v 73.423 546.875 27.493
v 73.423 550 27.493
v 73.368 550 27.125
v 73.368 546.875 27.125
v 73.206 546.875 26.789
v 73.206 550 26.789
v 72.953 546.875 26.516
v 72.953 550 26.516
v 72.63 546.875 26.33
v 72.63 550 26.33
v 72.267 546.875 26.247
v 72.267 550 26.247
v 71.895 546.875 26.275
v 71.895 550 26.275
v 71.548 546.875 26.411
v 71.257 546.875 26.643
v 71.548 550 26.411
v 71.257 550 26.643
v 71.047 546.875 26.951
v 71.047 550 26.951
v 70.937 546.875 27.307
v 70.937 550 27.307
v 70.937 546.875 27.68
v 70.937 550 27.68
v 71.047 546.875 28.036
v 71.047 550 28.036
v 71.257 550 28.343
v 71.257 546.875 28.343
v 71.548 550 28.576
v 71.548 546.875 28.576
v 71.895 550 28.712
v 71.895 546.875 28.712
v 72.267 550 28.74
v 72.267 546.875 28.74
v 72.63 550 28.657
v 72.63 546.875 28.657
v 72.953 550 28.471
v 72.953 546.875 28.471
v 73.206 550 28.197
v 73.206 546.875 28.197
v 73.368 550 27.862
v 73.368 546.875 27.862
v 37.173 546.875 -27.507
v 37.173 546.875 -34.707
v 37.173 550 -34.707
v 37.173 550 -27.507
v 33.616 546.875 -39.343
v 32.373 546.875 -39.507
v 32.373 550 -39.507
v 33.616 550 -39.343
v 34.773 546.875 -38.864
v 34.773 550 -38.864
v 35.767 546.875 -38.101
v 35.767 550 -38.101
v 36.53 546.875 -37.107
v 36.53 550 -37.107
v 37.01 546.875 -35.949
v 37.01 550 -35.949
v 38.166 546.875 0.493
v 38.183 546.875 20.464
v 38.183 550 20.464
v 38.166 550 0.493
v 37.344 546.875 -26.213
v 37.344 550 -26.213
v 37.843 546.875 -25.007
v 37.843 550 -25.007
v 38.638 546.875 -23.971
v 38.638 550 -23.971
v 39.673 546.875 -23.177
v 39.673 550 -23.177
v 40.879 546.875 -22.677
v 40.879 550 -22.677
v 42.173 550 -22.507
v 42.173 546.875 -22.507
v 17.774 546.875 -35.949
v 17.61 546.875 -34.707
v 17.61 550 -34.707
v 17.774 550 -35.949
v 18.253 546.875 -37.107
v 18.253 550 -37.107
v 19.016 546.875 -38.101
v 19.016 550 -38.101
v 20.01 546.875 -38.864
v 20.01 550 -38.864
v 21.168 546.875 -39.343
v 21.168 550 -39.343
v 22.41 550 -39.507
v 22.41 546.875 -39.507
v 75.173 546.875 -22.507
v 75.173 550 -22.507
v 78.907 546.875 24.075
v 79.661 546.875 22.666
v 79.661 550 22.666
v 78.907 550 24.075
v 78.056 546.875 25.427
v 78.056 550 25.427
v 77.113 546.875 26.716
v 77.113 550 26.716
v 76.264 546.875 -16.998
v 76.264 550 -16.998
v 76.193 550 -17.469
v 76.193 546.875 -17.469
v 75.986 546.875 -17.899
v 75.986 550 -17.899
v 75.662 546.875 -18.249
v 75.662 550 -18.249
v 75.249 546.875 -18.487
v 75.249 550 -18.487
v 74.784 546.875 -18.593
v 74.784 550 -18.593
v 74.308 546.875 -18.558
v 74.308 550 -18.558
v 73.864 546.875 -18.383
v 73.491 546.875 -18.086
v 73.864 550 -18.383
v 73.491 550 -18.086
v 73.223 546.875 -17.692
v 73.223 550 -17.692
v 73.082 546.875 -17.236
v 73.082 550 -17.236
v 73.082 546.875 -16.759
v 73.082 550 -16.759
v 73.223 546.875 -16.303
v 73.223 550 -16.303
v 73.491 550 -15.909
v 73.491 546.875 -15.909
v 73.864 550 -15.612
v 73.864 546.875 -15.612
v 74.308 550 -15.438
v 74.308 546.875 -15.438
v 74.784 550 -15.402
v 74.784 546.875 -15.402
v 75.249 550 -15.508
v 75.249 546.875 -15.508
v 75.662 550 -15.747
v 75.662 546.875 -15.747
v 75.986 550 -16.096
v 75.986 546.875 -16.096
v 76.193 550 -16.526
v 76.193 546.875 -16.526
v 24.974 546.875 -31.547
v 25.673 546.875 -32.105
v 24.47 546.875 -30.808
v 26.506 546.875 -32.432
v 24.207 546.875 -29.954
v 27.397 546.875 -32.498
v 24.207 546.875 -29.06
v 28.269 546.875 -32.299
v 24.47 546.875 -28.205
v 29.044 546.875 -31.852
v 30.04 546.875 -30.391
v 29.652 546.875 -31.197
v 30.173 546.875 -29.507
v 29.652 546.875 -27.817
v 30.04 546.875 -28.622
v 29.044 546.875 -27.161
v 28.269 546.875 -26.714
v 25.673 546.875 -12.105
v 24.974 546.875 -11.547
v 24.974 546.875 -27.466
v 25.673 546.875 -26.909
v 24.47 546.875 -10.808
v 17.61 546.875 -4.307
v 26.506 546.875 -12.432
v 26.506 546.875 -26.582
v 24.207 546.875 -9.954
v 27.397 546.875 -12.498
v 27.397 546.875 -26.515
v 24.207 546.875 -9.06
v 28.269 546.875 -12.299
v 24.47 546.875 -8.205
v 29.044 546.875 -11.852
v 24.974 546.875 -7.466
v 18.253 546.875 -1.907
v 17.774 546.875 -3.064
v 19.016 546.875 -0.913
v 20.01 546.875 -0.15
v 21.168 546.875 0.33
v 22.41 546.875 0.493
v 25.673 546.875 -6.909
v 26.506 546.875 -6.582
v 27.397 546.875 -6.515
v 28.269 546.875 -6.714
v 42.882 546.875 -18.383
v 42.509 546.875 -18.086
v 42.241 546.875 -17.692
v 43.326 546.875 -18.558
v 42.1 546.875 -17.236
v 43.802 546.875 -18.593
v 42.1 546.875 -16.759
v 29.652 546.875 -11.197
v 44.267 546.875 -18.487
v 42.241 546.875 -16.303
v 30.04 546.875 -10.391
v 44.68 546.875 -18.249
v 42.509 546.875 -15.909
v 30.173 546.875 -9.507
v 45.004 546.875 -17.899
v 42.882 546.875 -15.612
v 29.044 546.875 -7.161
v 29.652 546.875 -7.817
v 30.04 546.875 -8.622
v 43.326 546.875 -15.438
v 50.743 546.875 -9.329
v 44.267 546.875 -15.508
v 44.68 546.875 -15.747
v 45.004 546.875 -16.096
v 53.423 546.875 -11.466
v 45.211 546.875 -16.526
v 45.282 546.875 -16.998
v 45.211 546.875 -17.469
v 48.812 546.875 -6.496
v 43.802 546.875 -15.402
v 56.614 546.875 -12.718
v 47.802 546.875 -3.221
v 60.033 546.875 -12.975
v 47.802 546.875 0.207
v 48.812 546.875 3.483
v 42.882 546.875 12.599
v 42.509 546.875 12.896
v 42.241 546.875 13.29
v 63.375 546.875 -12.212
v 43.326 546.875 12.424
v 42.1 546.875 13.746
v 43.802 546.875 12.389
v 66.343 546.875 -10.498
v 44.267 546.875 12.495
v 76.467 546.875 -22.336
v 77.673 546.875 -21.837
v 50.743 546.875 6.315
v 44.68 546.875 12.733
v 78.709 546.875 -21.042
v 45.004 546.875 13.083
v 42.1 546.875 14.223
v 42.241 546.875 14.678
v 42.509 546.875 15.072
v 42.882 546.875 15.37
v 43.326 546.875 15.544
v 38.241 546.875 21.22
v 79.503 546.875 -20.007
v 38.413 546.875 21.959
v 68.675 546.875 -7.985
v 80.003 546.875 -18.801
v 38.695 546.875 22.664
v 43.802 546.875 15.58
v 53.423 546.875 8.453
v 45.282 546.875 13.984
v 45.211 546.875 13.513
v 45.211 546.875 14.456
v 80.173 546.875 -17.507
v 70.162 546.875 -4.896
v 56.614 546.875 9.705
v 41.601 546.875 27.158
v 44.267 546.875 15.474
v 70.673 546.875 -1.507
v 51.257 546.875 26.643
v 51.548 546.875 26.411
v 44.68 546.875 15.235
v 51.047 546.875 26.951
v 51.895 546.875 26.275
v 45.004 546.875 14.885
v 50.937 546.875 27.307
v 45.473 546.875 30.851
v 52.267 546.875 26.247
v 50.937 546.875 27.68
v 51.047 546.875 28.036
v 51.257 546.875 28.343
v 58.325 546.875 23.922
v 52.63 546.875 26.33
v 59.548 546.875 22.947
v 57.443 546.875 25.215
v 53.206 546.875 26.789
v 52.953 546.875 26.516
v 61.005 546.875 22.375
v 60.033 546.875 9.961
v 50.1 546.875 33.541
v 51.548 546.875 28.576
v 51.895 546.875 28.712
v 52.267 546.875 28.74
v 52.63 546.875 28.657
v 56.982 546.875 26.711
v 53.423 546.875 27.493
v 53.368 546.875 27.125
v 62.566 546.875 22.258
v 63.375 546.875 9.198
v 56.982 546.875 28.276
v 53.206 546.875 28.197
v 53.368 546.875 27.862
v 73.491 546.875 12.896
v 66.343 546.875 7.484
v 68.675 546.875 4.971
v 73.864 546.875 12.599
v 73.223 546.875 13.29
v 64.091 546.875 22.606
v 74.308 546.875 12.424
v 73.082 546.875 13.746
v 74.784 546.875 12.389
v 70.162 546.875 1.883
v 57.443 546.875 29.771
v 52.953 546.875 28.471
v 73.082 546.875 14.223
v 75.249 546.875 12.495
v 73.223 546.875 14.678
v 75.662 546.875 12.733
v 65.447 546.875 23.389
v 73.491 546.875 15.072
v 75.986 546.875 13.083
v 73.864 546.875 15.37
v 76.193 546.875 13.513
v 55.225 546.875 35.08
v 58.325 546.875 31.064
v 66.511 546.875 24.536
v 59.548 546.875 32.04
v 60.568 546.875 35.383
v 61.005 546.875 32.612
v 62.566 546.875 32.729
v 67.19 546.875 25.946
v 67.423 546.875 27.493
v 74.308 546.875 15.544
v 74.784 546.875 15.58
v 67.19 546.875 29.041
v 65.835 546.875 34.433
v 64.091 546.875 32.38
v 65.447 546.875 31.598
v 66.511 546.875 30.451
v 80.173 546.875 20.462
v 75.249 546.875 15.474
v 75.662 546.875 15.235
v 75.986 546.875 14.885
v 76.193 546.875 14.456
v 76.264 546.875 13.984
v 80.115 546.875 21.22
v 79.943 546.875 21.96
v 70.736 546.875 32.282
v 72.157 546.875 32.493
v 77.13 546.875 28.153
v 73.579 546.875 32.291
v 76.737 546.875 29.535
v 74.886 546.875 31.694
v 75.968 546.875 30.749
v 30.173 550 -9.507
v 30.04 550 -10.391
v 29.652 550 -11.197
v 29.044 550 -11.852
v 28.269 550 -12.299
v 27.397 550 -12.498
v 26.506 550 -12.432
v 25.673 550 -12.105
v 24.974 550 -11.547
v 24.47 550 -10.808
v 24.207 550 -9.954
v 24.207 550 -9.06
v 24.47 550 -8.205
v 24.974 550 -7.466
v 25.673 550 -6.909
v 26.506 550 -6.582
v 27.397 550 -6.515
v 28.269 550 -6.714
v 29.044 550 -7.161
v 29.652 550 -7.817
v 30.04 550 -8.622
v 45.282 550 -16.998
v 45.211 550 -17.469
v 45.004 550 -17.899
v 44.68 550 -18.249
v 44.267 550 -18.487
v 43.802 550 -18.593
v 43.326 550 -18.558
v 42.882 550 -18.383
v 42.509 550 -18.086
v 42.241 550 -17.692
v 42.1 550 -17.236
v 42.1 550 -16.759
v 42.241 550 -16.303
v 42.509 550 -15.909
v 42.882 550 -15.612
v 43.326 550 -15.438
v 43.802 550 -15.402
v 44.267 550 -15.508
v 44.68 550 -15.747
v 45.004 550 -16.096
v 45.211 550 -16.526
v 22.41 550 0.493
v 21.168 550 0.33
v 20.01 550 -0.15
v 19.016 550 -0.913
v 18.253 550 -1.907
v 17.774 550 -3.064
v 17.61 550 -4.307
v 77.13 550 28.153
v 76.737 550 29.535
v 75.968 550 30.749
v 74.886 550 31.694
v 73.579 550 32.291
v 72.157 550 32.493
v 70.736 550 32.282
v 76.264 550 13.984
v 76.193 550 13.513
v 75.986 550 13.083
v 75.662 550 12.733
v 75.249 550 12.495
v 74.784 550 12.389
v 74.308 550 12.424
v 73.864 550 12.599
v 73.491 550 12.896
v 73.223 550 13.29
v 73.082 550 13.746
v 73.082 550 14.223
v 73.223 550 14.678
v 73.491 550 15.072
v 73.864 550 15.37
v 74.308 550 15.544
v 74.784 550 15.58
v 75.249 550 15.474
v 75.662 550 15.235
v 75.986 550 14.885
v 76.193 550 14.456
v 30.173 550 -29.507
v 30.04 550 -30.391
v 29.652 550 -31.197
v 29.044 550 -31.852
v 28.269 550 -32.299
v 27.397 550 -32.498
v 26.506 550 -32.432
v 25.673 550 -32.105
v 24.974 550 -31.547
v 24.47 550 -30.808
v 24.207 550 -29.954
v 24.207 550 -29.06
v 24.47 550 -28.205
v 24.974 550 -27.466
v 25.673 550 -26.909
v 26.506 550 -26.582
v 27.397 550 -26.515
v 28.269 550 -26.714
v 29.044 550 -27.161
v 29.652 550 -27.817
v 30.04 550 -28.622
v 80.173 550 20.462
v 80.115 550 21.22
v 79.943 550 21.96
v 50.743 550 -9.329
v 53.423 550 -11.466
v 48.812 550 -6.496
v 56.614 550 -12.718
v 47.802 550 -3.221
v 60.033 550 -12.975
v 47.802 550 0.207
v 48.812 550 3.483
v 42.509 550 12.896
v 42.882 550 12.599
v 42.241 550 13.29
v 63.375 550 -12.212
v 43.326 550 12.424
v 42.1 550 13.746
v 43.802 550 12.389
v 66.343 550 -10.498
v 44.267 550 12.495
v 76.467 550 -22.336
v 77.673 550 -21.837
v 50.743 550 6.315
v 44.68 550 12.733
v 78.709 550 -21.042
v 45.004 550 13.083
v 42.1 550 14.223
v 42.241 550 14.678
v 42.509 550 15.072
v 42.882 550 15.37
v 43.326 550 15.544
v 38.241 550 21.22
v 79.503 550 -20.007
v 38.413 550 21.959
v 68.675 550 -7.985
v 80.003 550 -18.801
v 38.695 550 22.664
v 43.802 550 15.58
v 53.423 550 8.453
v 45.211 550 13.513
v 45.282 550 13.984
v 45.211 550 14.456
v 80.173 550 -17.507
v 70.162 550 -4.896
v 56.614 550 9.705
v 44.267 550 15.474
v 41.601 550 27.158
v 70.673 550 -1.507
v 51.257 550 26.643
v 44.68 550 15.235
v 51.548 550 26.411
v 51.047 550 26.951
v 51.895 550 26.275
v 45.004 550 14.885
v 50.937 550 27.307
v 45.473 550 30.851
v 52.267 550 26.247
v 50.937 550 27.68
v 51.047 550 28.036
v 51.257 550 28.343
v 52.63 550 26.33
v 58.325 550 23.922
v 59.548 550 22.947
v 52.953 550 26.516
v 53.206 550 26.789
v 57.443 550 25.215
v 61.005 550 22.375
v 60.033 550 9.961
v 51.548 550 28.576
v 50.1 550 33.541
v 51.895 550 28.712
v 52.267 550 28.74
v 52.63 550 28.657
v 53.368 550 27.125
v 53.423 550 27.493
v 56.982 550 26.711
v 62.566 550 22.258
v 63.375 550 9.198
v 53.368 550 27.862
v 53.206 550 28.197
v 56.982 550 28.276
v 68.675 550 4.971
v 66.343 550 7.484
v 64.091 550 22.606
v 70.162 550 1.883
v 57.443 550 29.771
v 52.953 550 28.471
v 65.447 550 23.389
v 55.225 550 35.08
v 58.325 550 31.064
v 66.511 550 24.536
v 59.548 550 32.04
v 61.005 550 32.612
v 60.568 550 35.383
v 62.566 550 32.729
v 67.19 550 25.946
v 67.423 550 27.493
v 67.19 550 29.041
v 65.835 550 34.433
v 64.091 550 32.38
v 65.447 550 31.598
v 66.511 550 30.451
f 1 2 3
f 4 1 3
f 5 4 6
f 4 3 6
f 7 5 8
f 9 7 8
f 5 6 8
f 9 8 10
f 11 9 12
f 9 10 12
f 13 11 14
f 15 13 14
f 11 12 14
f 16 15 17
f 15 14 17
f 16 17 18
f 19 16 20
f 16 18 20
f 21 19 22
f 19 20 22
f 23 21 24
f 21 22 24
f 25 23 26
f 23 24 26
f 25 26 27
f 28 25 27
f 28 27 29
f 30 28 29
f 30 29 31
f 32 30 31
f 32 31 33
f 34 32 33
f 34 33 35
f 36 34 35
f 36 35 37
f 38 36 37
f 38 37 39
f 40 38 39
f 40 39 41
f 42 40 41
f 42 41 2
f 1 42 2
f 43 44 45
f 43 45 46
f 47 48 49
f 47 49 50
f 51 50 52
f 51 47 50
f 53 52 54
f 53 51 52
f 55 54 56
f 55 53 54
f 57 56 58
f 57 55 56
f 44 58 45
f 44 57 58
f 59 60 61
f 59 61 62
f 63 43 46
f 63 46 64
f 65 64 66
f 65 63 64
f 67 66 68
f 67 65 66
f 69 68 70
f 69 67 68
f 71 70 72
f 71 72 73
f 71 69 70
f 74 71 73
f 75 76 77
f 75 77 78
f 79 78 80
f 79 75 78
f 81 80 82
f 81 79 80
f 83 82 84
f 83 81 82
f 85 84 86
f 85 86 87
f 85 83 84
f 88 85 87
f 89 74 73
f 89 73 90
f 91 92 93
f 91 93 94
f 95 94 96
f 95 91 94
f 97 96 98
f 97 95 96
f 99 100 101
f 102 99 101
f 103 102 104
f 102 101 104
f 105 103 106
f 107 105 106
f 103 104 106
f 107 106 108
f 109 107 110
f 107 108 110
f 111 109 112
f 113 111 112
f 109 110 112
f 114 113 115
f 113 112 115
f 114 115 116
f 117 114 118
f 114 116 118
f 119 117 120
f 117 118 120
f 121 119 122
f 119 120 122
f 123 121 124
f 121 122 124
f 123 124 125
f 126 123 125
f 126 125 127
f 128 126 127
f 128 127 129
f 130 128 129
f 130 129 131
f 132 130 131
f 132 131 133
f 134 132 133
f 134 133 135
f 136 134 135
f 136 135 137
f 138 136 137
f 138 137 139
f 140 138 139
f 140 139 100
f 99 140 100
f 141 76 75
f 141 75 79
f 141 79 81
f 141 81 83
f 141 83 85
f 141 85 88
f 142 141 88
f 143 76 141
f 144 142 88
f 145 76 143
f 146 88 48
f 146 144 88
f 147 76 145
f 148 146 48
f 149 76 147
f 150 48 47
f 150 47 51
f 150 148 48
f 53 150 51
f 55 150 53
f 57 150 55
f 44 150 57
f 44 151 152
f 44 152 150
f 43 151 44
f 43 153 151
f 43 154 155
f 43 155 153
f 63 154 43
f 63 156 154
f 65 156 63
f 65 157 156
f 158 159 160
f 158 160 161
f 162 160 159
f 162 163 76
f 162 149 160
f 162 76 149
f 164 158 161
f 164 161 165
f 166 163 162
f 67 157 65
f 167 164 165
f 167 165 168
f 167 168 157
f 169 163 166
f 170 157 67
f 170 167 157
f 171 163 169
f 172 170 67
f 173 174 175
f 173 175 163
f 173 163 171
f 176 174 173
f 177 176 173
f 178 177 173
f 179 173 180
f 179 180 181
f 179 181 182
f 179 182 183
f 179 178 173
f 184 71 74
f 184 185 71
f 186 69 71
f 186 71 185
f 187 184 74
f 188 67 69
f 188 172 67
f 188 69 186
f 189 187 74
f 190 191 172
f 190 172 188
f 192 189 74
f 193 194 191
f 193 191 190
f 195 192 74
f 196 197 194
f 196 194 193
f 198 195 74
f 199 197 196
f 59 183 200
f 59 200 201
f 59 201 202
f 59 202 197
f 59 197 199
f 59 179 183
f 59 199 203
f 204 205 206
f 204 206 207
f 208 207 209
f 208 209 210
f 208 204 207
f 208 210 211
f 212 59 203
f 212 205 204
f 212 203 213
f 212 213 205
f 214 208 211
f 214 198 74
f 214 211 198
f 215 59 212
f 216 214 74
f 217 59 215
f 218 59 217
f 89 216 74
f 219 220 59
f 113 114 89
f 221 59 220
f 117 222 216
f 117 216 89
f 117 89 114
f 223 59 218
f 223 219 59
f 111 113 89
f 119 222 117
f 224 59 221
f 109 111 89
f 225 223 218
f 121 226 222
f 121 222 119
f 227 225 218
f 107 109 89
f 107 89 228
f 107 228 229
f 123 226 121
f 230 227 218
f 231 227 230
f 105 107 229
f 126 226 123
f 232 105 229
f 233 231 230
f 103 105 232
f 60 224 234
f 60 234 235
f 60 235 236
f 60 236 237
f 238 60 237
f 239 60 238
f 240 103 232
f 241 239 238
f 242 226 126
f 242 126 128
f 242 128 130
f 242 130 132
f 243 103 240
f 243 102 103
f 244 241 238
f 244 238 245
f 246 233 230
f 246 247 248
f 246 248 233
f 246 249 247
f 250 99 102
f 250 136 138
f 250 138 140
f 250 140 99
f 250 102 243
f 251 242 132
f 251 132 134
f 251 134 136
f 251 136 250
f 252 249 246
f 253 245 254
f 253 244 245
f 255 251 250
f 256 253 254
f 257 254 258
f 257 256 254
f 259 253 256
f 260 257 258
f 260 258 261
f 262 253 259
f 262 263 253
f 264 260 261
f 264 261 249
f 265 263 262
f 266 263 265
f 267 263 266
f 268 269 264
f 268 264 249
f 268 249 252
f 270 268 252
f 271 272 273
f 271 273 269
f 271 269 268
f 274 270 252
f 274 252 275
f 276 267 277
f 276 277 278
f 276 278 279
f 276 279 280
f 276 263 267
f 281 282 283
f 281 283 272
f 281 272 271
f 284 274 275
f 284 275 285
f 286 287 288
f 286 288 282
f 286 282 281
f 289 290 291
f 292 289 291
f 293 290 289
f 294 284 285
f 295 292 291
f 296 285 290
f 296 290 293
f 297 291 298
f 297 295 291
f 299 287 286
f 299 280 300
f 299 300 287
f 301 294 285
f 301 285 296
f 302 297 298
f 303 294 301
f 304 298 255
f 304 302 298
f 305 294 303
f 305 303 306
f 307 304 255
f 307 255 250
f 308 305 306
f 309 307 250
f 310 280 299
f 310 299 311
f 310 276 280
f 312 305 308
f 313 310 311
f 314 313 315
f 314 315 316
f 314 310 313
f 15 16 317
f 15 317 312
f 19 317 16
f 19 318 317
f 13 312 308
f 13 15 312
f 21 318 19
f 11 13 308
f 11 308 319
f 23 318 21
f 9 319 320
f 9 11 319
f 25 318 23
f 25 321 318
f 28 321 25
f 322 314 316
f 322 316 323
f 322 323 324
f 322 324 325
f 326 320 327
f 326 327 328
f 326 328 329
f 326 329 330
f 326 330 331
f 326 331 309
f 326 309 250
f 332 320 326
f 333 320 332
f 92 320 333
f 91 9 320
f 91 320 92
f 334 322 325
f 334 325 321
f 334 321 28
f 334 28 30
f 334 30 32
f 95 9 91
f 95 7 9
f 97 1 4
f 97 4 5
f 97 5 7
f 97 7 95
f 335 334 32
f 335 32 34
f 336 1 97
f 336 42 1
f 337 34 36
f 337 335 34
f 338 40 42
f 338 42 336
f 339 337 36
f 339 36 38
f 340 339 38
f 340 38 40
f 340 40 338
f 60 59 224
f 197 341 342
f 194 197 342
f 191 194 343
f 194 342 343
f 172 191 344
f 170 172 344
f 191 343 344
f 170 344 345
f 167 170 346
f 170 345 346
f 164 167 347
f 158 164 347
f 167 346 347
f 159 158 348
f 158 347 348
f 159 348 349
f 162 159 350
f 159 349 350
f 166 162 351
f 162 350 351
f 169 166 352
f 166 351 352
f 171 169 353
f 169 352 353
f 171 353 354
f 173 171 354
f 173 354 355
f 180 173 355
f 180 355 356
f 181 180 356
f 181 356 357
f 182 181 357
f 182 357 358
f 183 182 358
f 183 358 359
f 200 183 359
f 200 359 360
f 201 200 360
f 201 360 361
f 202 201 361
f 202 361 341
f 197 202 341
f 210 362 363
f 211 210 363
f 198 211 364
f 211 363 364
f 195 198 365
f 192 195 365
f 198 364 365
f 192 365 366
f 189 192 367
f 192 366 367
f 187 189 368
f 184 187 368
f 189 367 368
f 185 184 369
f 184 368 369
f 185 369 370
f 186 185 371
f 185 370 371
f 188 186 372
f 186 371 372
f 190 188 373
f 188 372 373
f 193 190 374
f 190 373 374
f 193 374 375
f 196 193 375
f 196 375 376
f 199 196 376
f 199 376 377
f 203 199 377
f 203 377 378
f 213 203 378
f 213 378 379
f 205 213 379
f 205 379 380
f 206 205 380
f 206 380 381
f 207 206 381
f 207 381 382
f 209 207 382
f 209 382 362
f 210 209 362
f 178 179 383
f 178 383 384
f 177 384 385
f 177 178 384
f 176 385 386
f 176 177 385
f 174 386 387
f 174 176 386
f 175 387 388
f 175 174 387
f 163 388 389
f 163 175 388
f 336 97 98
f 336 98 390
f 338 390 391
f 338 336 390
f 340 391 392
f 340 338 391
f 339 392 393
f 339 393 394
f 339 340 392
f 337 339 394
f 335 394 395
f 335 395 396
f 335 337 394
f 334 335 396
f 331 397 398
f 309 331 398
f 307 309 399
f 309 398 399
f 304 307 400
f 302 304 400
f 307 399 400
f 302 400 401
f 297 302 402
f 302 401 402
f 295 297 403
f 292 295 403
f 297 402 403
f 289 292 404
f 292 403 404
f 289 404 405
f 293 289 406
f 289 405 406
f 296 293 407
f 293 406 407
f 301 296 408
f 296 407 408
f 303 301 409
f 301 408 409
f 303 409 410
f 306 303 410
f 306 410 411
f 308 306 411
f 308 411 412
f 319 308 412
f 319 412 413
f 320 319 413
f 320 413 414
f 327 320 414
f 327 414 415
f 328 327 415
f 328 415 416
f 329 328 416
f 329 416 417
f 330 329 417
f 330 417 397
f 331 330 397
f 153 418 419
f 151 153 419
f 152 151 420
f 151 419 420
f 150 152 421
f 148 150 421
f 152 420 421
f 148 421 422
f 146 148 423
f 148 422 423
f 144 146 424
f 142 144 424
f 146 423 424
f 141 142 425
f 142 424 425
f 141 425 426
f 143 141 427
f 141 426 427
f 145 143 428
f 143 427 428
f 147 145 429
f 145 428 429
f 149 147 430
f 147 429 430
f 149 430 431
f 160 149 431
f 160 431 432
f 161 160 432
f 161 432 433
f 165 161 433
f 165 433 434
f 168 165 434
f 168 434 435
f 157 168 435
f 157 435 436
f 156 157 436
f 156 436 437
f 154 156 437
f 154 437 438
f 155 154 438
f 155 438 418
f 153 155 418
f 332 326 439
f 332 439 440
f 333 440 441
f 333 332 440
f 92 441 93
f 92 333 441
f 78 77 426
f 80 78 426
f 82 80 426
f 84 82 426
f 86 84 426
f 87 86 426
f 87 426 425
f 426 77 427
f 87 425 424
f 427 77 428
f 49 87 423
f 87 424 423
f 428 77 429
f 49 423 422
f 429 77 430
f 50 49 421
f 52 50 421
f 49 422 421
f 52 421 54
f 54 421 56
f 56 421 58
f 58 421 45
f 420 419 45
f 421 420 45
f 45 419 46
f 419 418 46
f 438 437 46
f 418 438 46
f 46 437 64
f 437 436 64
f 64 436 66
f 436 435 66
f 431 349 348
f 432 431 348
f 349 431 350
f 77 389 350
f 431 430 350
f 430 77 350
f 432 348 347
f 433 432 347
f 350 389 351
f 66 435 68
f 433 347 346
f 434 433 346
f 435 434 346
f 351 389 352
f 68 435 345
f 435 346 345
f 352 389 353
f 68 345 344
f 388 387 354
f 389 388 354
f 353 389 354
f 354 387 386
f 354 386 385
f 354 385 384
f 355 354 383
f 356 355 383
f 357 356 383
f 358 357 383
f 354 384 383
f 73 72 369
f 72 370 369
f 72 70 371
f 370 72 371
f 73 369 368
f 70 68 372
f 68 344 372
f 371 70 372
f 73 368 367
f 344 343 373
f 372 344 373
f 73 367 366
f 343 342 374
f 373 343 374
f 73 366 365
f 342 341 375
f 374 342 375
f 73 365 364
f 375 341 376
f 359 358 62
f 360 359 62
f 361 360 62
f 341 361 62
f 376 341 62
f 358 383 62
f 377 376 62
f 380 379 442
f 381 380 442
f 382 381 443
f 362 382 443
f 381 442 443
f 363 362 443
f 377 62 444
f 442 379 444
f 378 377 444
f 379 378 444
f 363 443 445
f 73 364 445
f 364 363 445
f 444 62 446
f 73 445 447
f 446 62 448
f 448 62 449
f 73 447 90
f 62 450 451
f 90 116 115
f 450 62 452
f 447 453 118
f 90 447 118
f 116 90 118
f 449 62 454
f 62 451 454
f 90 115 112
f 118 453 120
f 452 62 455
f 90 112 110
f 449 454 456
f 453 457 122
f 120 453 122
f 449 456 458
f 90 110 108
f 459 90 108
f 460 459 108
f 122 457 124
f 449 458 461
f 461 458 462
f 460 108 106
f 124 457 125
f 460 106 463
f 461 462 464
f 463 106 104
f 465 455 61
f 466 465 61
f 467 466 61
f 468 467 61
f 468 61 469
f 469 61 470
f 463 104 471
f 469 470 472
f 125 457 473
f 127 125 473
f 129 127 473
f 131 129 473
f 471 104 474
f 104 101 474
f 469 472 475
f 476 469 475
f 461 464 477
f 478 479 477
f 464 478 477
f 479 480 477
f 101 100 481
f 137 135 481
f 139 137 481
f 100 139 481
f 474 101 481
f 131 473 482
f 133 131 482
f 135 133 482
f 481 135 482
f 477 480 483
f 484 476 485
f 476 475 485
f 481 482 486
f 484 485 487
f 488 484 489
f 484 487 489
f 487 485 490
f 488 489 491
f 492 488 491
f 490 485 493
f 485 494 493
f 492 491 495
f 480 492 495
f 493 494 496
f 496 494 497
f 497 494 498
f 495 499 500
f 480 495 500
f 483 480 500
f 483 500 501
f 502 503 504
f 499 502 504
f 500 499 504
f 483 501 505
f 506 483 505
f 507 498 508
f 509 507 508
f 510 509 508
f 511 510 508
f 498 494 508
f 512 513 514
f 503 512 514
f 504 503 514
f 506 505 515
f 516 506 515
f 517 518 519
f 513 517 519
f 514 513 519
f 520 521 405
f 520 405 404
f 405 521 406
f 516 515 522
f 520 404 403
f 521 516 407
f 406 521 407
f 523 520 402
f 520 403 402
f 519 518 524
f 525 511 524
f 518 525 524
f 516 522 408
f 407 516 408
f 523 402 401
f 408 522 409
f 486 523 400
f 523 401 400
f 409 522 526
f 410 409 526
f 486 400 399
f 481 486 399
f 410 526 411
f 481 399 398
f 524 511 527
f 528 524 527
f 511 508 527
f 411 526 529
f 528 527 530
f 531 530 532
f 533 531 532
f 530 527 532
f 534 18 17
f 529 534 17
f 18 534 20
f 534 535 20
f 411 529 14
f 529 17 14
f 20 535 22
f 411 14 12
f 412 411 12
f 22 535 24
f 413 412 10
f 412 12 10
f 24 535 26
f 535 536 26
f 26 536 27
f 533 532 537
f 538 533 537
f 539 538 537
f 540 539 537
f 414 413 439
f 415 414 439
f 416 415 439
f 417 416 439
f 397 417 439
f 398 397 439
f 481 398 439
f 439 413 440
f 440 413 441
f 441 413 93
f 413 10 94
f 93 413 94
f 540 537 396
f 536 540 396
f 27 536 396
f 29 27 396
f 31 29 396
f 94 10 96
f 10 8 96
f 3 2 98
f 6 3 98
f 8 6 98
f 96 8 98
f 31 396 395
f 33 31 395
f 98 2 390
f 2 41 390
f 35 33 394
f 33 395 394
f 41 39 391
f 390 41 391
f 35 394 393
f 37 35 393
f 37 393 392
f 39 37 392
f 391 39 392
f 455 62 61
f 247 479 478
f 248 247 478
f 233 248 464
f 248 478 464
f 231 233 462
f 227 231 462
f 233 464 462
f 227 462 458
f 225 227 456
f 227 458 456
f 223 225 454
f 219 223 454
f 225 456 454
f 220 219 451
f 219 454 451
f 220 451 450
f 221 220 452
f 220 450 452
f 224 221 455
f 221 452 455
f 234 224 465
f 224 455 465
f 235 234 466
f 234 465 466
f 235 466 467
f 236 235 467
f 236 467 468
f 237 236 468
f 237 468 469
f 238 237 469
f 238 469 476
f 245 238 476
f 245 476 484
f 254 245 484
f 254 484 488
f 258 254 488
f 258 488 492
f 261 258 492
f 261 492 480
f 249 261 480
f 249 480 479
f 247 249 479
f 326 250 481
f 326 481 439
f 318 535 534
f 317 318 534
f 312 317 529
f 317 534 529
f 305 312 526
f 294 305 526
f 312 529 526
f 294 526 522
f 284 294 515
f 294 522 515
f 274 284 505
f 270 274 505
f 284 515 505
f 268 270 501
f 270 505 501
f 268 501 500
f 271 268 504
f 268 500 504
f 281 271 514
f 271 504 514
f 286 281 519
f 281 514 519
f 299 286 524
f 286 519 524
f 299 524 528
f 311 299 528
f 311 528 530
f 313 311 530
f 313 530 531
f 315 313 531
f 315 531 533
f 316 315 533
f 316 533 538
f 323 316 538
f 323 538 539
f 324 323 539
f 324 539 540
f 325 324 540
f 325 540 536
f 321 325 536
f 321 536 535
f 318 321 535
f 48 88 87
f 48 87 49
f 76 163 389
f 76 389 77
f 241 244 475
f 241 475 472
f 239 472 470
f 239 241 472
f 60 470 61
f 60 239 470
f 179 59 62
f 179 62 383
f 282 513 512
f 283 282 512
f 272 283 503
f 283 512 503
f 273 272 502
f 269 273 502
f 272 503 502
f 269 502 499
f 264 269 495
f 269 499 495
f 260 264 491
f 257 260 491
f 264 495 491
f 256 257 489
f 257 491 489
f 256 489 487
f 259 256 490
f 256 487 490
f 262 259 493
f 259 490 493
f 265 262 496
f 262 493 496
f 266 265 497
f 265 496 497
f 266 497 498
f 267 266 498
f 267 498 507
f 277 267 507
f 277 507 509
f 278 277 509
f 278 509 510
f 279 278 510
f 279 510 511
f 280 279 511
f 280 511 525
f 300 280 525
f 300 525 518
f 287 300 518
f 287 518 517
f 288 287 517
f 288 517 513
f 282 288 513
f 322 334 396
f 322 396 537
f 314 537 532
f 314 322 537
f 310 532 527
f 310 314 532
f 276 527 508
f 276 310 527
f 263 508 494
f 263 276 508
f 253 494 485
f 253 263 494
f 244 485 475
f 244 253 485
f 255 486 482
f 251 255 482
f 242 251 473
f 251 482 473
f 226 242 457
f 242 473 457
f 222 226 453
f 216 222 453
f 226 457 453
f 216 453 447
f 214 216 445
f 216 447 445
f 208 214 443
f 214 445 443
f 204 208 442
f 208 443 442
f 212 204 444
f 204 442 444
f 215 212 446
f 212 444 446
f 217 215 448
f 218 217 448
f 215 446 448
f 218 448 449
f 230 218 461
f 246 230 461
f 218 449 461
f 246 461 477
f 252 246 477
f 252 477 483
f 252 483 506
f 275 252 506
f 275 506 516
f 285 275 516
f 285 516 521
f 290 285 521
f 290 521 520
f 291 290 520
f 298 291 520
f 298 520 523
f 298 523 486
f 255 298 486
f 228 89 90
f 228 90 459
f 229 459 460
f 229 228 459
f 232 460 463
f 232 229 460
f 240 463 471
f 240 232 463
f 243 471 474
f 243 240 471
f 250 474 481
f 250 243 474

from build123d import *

# Parameters (mm, degrees)
BASE_FLANGE1_DEPTH           = 3.125
F_10_5_10_5_DIAMETER_HOLE1_D = 10.5
F_3_2_3_2_DIAMETER_HOLE1_D   = 3.2
F_23_0_23_DIAMETER_HOLE1_D   = 23
F_6_0_6_DIAMETER_HOLE1_D     = 6
F_2_5_2_5_DIAMETER_HOLE1_D   = 2.5


# Sheet-metal steps are written as plain solids
with BuildPart() as part:
    # Sketch11 → Base-Flange1 (new body)
    with BuildSketch(Plane.XZ.offset(-546.875)):
        with BuildLine():
            Line((22.410254546, -39.506758362), (32.373254546, -39.506758362))
            ThreePointArc((32.373254546, -39.506758362), (35.767367096, -38.100870912), (37.173254546, -34.706758362))
            Line((37.173254546, -34.706758362), (37.173254546, -27.506758362))
            ThreePointArc((37.173254546, -27.506758362), (38.63772064, -23.971224456), (42.173254546, -22.506758362))
            Line((42.173254546, -22.506758362), (75.173254546, -22.506758362))
            ThreePointArc((75.173254546, -22.506758362), (78.708788452, -21.042292268), (80.173254546, -17.506758362))
            Line((80.173254546, -17.506758362), (80.173254546, 20.461534485))
            ThreePointArc((80.173254546, 20.461534485), (80.043518399, 21.59313954), (79.661042546, 22.666020563))
            ThreePointArc((79.661042546, 22.666020563), (78.493233643, 24.758111736), (77.112510881, 26.71623016))
            ThreePointArc((77.112510881, 26.71623016), (75.461078133, 31.260231972), (70.735506318, 32.282070323))
            ThreePointArc((70.735506318, 32.282070323), (52.617226801, 34.461366888), (38.694730703, 22.663676919))
            ThreePointArc((38.694730703, 22.663676919), (38.312910767, 21.593045514), (38.182772618, 20.463841312))
            Line((38.182772618, 20.463841312), (38.16624905, 0.493241638))
            Line((38.16624905, 0.493241638), (22.410254546, 0.493241638))
            ThreePointArc((22.410254546, 0.493241638), (19.016141997, -0.912645812), (17.610254546, -4.306758362))
            Line((17.610254546, -4.306758362), (17.610254546, -34.706758362))
            ThreePointArc((17.610254546, -34.706758362), (19.016141997, -38.100870912), (22.410254546, -39.506758362))
        make_face()
    extrude(amount=-BASE_FLANGE1_DEPTH)

    # Ø10.5 (10.5) Diameter Hole1 (through all)
    with Locations(Plane(origin=(0, 546.875, 0), x_dir=(-1, 0, 0), z_dir=(0, -1, 0))):
        with Locations((-62.173254546, -27.493241638)):
            Hole(F_10_5_10_5_DIAMETER_HOLE1_D / 2)

    # Ø3.2 (3.2) Diameter Hole1 (through all)
    with Locations(Plane(origin=(0, 546.875, 0), x_dir=(-1, 0, 0), z_dir=(0, -1, 0))):
        with Locations((-74.664196355, -13.984183447), (-43.682312737, -13.984183447), (-43.682312737, 16.997700171), (-74.664196355, 16.997700171)):
            Hole(F_3_2_3_2_DIAMETER_HOLE1_D / 2)

    # Ø23.0 (23) Diameter Hole1 (through all)
    with Locations(Plane(origin=(0, 546.875, 0), x_dir=(-1, 0, 0), z_dir=(0, -1, 0))):
        with Locations((-59.173254546, 1.506758362)):
            Hole(F_23_0_23_DIAMETER_HOLE1_D / 2)

    # Ø6.0 (6) Diameter Hole1 (through all)
    with Locations(Plane(origin=(0, 546.875, 0), x_dir=(-1, 0, 0), z_dir=(0, -1, 0))):
        with Locations((-27.173254546, 9.506758362), (-27.173254546, 29.506758362)):
            Hole(F_6_0_6_DIAMETER_HOLE1_D / 2)

    # Ø2.5 (2.5) Diameter Hole1 (through all)
    with Locations(Plane(origin=(0, 546.875, 0), x_dir=(-1, 0, 0), z_dir=(0, -1, 0))):
        with Locations((-72.173254546, -27.493241653), (-52.173254546, -27.493241653)):
            Hole(F_2_5_2_5_DIAMETER_HOLE1_D / 2)


solid = part.part
